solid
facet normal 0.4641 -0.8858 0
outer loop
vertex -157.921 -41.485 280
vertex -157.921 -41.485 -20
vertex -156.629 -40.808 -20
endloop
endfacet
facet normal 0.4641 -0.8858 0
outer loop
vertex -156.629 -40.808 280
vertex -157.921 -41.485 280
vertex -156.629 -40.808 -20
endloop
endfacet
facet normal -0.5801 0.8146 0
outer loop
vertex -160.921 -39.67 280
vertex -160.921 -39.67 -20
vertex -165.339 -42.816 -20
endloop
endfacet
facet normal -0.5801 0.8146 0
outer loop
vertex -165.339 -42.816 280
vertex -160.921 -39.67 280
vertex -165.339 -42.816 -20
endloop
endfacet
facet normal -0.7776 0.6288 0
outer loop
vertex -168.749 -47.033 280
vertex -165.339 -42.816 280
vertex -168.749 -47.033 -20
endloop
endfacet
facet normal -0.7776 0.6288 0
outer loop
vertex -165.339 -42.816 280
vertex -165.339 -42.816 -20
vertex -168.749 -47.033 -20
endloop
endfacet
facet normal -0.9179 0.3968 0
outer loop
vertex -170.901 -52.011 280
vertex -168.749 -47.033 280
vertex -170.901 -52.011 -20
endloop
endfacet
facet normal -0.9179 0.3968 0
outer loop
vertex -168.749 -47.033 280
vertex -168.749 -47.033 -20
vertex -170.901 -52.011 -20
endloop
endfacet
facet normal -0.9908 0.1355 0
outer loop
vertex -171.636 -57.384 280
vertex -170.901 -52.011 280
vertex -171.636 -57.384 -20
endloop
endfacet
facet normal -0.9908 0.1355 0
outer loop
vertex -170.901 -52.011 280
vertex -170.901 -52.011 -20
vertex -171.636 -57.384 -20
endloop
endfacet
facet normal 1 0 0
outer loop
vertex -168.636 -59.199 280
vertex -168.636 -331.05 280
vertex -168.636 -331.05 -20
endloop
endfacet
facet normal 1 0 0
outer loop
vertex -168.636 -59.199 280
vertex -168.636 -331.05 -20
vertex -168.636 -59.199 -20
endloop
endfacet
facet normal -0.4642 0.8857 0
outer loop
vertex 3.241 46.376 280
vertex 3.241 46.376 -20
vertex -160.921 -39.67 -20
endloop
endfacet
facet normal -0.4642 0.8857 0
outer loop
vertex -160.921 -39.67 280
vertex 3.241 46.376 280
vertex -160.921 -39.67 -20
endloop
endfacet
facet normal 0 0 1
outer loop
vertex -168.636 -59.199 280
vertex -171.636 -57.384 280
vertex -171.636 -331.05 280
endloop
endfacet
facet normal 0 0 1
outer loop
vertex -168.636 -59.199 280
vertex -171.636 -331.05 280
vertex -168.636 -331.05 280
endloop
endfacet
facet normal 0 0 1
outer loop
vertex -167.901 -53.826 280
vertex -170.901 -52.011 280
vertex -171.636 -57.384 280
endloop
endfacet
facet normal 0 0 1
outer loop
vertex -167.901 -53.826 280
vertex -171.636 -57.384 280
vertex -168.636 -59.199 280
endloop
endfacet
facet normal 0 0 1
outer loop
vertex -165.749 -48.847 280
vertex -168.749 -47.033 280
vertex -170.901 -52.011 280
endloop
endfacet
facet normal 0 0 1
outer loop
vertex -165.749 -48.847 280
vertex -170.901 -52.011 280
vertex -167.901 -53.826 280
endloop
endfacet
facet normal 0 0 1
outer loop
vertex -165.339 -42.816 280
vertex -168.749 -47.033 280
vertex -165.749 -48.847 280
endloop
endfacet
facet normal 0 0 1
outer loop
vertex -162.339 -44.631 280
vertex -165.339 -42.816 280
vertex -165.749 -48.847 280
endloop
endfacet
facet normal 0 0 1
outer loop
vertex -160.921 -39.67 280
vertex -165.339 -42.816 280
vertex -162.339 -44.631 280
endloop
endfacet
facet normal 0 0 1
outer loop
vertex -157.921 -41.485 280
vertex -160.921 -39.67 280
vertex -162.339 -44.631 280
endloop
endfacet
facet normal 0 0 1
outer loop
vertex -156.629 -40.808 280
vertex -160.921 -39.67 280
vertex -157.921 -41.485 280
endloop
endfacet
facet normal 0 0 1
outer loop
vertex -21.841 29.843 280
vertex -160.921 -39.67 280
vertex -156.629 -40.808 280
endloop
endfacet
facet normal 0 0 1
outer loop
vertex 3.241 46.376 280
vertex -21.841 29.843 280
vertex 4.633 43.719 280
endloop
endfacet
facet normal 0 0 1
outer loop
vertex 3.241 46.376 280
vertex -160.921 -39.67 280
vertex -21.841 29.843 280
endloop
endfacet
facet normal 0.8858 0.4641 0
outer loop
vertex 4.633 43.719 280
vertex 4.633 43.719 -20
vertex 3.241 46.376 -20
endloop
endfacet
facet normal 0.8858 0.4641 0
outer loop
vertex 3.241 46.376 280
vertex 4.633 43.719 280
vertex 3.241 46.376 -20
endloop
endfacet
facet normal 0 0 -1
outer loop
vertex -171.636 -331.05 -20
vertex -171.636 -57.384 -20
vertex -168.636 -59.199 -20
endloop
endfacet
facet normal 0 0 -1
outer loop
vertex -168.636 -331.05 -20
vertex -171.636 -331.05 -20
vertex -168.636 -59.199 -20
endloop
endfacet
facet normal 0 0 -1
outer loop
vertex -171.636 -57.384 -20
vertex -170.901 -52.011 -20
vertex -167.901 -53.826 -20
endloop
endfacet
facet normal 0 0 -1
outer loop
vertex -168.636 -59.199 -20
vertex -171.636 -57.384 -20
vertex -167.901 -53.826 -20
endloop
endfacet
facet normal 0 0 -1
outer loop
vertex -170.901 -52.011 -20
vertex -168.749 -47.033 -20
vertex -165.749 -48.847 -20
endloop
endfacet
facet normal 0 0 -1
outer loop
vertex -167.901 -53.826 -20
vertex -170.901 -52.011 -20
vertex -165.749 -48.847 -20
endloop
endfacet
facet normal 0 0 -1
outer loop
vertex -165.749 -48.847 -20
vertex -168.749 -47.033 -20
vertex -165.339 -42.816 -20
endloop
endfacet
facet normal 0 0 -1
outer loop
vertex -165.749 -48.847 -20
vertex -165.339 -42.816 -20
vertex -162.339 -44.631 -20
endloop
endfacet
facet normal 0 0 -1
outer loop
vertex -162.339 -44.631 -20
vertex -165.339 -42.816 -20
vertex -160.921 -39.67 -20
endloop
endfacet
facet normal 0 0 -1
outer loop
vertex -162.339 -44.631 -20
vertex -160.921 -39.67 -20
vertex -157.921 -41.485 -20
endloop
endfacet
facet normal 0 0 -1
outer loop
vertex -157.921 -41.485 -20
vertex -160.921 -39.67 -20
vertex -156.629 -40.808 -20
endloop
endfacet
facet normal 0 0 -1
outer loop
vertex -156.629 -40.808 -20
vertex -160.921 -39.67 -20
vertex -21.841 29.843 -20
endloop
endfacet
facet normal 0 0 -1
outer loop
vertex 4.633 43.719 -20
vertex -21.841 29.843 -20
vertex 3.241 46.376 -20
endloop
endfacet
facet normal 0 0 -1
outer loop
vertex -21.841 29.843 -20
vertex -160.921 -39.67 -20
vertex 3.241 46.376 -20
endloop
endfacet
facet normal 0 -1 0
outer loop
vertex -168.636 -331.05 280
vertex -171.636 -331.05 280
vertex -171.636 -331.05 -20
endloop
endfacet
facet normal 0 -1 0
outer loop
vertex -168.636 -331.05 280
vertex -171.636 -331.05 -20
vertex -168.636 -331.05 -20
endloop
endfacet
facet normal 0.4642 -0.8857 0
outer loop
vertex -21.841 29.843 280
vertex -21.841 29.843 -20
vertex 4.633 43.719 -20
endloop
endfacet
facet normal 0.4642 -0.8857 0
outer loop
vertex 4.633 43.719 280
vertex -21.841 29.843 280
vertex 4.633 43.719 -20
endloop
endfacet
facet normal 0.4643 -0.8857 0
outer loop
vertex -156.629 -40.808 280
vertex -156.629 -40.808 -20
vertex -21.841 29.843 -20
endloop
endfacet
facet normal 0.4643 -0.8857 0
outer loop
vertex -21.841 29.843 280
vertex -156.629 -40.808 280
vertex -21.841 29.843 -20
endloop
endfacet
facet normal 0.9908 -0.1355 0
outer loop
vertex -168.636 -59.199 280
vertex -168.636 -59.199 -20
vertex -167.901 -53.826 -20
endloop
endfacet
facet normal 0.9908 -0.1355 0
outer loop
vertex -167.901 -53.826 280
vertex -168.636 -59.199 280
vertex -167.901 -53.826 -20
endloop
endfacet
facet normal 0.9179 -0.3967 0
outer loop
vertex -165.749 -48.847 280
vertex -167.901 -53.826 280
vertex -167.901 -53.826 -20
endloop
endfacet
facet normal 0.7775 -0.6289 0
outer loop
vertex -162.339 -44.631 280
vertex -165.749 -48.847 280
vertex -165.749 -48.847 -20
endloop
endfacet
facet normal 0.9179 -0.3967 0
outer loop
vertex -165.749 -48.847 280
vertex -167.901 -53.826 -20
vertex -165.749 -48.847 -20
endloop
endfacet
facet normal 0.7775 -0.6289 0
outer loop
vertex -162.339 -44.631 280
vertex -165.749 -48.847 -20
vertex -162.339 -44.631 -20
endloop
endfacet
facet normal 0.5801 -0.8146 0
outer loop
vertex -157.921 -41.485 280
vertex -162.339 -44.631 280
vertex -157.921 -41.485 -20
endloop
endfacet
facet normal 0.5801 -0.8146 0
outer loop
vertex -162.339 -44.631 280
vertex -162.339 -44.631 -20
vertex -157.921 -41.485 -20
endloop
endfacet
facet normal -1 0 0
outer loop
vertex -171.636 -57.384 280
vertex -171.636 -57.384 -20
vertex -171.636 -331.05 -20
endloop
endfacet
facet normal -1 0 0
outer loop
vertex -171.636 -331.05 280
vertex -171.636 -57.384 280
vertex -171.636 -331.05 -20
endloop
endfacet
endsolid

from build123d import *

# Parameters (mm, degrees)
BOSS_EXTRUDE1_DEPTH      = 280
BOSS_EXTRUDE1_DEPTH_BACK = 20


with BuildPart() as part:
    # Sketch1 → Boss-Extrude1 (new, two sides: drawn at the far end of the back side and taken through both)
    with BuildSketch(Plane.XY.offset(-BOSS_EXTRUDE1_DEPTH_BACK)):
        with BuildLine():
            Line((-170.37773053, -331.05), (-168.636, -331.05))
            Line((-168.636, -331.05), (-168.636, -59.198829312))
            ThreePointArc((-168.636, -59.198829312), (-165.748851618, -48.847485946), (-157.920969051, -41.484729004))
            Line((-157.920969051, -41.484729004), (-156.629100836, -40.807587282))
            Line((-156.629100836, -40.807587282), (-21.840950481, 29.842560493))
            Line((-21.840950481, 29.842560493), (4.633492495, 43.719324167))
            Line((4.633492495, 43.719324167), (3.240747138, 46.376439213))
            Line((3.240747138, 46.376439213), (-160.920969051, -39.670067673))
            ThreePointArc((-160.920969051, -39.670067673), (-168.748851618, -47.032824615), (-171.636, -57.384167981))
            Line((-171.636, -57.384167981), (-171.636, -331.05))
            Line((-171.636, -331.05), (-170.37773053, -331.05))
        make_face()
    extrude(amount=BOSS_EXTRUDE1_DEPTH + BOSS_EXTRUDE1_DEPTH_BACK)


solid = part.part
